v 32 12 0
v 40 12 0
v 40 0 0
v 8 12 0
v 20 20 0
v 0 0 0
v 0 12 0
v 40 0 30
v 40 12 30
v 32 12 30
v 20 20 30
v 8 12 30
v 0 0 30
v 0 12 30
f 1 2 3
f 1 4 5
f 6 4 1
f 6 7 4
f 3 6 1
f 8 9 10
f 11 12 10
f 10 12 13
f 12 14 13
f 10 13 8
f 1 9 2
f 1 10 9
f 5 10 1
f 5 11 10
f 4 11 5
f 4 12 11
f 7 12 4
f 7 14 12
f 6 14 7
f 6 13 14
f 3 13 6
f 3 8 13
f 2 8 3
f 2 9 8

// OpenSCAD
$fn = 32;

// ----------------------------------------------------------------------
// V guide rail: vrib, 40 mm wide
// ----------------------------------------------------------------------

// --- parameters (mm) ---
rail_w = 40;              // rail width, X
base_t = 12;              // base plate thickness
v_depth = 8;              // V feature depth / height
v_half_w = 12;            // half width of the V at the base face
plate_t = 30;             // rail length, Z (the extrusion height)

profile = [[0, 0], [40, 0], [40, 12], [32, 12], [20, 20], [8, 12], [0, 12]];  // primary outline, 7 points, counter clockwise

// --- the one profile operation ---
linear_extrude(height = plate_t) polygon(points = profile);
